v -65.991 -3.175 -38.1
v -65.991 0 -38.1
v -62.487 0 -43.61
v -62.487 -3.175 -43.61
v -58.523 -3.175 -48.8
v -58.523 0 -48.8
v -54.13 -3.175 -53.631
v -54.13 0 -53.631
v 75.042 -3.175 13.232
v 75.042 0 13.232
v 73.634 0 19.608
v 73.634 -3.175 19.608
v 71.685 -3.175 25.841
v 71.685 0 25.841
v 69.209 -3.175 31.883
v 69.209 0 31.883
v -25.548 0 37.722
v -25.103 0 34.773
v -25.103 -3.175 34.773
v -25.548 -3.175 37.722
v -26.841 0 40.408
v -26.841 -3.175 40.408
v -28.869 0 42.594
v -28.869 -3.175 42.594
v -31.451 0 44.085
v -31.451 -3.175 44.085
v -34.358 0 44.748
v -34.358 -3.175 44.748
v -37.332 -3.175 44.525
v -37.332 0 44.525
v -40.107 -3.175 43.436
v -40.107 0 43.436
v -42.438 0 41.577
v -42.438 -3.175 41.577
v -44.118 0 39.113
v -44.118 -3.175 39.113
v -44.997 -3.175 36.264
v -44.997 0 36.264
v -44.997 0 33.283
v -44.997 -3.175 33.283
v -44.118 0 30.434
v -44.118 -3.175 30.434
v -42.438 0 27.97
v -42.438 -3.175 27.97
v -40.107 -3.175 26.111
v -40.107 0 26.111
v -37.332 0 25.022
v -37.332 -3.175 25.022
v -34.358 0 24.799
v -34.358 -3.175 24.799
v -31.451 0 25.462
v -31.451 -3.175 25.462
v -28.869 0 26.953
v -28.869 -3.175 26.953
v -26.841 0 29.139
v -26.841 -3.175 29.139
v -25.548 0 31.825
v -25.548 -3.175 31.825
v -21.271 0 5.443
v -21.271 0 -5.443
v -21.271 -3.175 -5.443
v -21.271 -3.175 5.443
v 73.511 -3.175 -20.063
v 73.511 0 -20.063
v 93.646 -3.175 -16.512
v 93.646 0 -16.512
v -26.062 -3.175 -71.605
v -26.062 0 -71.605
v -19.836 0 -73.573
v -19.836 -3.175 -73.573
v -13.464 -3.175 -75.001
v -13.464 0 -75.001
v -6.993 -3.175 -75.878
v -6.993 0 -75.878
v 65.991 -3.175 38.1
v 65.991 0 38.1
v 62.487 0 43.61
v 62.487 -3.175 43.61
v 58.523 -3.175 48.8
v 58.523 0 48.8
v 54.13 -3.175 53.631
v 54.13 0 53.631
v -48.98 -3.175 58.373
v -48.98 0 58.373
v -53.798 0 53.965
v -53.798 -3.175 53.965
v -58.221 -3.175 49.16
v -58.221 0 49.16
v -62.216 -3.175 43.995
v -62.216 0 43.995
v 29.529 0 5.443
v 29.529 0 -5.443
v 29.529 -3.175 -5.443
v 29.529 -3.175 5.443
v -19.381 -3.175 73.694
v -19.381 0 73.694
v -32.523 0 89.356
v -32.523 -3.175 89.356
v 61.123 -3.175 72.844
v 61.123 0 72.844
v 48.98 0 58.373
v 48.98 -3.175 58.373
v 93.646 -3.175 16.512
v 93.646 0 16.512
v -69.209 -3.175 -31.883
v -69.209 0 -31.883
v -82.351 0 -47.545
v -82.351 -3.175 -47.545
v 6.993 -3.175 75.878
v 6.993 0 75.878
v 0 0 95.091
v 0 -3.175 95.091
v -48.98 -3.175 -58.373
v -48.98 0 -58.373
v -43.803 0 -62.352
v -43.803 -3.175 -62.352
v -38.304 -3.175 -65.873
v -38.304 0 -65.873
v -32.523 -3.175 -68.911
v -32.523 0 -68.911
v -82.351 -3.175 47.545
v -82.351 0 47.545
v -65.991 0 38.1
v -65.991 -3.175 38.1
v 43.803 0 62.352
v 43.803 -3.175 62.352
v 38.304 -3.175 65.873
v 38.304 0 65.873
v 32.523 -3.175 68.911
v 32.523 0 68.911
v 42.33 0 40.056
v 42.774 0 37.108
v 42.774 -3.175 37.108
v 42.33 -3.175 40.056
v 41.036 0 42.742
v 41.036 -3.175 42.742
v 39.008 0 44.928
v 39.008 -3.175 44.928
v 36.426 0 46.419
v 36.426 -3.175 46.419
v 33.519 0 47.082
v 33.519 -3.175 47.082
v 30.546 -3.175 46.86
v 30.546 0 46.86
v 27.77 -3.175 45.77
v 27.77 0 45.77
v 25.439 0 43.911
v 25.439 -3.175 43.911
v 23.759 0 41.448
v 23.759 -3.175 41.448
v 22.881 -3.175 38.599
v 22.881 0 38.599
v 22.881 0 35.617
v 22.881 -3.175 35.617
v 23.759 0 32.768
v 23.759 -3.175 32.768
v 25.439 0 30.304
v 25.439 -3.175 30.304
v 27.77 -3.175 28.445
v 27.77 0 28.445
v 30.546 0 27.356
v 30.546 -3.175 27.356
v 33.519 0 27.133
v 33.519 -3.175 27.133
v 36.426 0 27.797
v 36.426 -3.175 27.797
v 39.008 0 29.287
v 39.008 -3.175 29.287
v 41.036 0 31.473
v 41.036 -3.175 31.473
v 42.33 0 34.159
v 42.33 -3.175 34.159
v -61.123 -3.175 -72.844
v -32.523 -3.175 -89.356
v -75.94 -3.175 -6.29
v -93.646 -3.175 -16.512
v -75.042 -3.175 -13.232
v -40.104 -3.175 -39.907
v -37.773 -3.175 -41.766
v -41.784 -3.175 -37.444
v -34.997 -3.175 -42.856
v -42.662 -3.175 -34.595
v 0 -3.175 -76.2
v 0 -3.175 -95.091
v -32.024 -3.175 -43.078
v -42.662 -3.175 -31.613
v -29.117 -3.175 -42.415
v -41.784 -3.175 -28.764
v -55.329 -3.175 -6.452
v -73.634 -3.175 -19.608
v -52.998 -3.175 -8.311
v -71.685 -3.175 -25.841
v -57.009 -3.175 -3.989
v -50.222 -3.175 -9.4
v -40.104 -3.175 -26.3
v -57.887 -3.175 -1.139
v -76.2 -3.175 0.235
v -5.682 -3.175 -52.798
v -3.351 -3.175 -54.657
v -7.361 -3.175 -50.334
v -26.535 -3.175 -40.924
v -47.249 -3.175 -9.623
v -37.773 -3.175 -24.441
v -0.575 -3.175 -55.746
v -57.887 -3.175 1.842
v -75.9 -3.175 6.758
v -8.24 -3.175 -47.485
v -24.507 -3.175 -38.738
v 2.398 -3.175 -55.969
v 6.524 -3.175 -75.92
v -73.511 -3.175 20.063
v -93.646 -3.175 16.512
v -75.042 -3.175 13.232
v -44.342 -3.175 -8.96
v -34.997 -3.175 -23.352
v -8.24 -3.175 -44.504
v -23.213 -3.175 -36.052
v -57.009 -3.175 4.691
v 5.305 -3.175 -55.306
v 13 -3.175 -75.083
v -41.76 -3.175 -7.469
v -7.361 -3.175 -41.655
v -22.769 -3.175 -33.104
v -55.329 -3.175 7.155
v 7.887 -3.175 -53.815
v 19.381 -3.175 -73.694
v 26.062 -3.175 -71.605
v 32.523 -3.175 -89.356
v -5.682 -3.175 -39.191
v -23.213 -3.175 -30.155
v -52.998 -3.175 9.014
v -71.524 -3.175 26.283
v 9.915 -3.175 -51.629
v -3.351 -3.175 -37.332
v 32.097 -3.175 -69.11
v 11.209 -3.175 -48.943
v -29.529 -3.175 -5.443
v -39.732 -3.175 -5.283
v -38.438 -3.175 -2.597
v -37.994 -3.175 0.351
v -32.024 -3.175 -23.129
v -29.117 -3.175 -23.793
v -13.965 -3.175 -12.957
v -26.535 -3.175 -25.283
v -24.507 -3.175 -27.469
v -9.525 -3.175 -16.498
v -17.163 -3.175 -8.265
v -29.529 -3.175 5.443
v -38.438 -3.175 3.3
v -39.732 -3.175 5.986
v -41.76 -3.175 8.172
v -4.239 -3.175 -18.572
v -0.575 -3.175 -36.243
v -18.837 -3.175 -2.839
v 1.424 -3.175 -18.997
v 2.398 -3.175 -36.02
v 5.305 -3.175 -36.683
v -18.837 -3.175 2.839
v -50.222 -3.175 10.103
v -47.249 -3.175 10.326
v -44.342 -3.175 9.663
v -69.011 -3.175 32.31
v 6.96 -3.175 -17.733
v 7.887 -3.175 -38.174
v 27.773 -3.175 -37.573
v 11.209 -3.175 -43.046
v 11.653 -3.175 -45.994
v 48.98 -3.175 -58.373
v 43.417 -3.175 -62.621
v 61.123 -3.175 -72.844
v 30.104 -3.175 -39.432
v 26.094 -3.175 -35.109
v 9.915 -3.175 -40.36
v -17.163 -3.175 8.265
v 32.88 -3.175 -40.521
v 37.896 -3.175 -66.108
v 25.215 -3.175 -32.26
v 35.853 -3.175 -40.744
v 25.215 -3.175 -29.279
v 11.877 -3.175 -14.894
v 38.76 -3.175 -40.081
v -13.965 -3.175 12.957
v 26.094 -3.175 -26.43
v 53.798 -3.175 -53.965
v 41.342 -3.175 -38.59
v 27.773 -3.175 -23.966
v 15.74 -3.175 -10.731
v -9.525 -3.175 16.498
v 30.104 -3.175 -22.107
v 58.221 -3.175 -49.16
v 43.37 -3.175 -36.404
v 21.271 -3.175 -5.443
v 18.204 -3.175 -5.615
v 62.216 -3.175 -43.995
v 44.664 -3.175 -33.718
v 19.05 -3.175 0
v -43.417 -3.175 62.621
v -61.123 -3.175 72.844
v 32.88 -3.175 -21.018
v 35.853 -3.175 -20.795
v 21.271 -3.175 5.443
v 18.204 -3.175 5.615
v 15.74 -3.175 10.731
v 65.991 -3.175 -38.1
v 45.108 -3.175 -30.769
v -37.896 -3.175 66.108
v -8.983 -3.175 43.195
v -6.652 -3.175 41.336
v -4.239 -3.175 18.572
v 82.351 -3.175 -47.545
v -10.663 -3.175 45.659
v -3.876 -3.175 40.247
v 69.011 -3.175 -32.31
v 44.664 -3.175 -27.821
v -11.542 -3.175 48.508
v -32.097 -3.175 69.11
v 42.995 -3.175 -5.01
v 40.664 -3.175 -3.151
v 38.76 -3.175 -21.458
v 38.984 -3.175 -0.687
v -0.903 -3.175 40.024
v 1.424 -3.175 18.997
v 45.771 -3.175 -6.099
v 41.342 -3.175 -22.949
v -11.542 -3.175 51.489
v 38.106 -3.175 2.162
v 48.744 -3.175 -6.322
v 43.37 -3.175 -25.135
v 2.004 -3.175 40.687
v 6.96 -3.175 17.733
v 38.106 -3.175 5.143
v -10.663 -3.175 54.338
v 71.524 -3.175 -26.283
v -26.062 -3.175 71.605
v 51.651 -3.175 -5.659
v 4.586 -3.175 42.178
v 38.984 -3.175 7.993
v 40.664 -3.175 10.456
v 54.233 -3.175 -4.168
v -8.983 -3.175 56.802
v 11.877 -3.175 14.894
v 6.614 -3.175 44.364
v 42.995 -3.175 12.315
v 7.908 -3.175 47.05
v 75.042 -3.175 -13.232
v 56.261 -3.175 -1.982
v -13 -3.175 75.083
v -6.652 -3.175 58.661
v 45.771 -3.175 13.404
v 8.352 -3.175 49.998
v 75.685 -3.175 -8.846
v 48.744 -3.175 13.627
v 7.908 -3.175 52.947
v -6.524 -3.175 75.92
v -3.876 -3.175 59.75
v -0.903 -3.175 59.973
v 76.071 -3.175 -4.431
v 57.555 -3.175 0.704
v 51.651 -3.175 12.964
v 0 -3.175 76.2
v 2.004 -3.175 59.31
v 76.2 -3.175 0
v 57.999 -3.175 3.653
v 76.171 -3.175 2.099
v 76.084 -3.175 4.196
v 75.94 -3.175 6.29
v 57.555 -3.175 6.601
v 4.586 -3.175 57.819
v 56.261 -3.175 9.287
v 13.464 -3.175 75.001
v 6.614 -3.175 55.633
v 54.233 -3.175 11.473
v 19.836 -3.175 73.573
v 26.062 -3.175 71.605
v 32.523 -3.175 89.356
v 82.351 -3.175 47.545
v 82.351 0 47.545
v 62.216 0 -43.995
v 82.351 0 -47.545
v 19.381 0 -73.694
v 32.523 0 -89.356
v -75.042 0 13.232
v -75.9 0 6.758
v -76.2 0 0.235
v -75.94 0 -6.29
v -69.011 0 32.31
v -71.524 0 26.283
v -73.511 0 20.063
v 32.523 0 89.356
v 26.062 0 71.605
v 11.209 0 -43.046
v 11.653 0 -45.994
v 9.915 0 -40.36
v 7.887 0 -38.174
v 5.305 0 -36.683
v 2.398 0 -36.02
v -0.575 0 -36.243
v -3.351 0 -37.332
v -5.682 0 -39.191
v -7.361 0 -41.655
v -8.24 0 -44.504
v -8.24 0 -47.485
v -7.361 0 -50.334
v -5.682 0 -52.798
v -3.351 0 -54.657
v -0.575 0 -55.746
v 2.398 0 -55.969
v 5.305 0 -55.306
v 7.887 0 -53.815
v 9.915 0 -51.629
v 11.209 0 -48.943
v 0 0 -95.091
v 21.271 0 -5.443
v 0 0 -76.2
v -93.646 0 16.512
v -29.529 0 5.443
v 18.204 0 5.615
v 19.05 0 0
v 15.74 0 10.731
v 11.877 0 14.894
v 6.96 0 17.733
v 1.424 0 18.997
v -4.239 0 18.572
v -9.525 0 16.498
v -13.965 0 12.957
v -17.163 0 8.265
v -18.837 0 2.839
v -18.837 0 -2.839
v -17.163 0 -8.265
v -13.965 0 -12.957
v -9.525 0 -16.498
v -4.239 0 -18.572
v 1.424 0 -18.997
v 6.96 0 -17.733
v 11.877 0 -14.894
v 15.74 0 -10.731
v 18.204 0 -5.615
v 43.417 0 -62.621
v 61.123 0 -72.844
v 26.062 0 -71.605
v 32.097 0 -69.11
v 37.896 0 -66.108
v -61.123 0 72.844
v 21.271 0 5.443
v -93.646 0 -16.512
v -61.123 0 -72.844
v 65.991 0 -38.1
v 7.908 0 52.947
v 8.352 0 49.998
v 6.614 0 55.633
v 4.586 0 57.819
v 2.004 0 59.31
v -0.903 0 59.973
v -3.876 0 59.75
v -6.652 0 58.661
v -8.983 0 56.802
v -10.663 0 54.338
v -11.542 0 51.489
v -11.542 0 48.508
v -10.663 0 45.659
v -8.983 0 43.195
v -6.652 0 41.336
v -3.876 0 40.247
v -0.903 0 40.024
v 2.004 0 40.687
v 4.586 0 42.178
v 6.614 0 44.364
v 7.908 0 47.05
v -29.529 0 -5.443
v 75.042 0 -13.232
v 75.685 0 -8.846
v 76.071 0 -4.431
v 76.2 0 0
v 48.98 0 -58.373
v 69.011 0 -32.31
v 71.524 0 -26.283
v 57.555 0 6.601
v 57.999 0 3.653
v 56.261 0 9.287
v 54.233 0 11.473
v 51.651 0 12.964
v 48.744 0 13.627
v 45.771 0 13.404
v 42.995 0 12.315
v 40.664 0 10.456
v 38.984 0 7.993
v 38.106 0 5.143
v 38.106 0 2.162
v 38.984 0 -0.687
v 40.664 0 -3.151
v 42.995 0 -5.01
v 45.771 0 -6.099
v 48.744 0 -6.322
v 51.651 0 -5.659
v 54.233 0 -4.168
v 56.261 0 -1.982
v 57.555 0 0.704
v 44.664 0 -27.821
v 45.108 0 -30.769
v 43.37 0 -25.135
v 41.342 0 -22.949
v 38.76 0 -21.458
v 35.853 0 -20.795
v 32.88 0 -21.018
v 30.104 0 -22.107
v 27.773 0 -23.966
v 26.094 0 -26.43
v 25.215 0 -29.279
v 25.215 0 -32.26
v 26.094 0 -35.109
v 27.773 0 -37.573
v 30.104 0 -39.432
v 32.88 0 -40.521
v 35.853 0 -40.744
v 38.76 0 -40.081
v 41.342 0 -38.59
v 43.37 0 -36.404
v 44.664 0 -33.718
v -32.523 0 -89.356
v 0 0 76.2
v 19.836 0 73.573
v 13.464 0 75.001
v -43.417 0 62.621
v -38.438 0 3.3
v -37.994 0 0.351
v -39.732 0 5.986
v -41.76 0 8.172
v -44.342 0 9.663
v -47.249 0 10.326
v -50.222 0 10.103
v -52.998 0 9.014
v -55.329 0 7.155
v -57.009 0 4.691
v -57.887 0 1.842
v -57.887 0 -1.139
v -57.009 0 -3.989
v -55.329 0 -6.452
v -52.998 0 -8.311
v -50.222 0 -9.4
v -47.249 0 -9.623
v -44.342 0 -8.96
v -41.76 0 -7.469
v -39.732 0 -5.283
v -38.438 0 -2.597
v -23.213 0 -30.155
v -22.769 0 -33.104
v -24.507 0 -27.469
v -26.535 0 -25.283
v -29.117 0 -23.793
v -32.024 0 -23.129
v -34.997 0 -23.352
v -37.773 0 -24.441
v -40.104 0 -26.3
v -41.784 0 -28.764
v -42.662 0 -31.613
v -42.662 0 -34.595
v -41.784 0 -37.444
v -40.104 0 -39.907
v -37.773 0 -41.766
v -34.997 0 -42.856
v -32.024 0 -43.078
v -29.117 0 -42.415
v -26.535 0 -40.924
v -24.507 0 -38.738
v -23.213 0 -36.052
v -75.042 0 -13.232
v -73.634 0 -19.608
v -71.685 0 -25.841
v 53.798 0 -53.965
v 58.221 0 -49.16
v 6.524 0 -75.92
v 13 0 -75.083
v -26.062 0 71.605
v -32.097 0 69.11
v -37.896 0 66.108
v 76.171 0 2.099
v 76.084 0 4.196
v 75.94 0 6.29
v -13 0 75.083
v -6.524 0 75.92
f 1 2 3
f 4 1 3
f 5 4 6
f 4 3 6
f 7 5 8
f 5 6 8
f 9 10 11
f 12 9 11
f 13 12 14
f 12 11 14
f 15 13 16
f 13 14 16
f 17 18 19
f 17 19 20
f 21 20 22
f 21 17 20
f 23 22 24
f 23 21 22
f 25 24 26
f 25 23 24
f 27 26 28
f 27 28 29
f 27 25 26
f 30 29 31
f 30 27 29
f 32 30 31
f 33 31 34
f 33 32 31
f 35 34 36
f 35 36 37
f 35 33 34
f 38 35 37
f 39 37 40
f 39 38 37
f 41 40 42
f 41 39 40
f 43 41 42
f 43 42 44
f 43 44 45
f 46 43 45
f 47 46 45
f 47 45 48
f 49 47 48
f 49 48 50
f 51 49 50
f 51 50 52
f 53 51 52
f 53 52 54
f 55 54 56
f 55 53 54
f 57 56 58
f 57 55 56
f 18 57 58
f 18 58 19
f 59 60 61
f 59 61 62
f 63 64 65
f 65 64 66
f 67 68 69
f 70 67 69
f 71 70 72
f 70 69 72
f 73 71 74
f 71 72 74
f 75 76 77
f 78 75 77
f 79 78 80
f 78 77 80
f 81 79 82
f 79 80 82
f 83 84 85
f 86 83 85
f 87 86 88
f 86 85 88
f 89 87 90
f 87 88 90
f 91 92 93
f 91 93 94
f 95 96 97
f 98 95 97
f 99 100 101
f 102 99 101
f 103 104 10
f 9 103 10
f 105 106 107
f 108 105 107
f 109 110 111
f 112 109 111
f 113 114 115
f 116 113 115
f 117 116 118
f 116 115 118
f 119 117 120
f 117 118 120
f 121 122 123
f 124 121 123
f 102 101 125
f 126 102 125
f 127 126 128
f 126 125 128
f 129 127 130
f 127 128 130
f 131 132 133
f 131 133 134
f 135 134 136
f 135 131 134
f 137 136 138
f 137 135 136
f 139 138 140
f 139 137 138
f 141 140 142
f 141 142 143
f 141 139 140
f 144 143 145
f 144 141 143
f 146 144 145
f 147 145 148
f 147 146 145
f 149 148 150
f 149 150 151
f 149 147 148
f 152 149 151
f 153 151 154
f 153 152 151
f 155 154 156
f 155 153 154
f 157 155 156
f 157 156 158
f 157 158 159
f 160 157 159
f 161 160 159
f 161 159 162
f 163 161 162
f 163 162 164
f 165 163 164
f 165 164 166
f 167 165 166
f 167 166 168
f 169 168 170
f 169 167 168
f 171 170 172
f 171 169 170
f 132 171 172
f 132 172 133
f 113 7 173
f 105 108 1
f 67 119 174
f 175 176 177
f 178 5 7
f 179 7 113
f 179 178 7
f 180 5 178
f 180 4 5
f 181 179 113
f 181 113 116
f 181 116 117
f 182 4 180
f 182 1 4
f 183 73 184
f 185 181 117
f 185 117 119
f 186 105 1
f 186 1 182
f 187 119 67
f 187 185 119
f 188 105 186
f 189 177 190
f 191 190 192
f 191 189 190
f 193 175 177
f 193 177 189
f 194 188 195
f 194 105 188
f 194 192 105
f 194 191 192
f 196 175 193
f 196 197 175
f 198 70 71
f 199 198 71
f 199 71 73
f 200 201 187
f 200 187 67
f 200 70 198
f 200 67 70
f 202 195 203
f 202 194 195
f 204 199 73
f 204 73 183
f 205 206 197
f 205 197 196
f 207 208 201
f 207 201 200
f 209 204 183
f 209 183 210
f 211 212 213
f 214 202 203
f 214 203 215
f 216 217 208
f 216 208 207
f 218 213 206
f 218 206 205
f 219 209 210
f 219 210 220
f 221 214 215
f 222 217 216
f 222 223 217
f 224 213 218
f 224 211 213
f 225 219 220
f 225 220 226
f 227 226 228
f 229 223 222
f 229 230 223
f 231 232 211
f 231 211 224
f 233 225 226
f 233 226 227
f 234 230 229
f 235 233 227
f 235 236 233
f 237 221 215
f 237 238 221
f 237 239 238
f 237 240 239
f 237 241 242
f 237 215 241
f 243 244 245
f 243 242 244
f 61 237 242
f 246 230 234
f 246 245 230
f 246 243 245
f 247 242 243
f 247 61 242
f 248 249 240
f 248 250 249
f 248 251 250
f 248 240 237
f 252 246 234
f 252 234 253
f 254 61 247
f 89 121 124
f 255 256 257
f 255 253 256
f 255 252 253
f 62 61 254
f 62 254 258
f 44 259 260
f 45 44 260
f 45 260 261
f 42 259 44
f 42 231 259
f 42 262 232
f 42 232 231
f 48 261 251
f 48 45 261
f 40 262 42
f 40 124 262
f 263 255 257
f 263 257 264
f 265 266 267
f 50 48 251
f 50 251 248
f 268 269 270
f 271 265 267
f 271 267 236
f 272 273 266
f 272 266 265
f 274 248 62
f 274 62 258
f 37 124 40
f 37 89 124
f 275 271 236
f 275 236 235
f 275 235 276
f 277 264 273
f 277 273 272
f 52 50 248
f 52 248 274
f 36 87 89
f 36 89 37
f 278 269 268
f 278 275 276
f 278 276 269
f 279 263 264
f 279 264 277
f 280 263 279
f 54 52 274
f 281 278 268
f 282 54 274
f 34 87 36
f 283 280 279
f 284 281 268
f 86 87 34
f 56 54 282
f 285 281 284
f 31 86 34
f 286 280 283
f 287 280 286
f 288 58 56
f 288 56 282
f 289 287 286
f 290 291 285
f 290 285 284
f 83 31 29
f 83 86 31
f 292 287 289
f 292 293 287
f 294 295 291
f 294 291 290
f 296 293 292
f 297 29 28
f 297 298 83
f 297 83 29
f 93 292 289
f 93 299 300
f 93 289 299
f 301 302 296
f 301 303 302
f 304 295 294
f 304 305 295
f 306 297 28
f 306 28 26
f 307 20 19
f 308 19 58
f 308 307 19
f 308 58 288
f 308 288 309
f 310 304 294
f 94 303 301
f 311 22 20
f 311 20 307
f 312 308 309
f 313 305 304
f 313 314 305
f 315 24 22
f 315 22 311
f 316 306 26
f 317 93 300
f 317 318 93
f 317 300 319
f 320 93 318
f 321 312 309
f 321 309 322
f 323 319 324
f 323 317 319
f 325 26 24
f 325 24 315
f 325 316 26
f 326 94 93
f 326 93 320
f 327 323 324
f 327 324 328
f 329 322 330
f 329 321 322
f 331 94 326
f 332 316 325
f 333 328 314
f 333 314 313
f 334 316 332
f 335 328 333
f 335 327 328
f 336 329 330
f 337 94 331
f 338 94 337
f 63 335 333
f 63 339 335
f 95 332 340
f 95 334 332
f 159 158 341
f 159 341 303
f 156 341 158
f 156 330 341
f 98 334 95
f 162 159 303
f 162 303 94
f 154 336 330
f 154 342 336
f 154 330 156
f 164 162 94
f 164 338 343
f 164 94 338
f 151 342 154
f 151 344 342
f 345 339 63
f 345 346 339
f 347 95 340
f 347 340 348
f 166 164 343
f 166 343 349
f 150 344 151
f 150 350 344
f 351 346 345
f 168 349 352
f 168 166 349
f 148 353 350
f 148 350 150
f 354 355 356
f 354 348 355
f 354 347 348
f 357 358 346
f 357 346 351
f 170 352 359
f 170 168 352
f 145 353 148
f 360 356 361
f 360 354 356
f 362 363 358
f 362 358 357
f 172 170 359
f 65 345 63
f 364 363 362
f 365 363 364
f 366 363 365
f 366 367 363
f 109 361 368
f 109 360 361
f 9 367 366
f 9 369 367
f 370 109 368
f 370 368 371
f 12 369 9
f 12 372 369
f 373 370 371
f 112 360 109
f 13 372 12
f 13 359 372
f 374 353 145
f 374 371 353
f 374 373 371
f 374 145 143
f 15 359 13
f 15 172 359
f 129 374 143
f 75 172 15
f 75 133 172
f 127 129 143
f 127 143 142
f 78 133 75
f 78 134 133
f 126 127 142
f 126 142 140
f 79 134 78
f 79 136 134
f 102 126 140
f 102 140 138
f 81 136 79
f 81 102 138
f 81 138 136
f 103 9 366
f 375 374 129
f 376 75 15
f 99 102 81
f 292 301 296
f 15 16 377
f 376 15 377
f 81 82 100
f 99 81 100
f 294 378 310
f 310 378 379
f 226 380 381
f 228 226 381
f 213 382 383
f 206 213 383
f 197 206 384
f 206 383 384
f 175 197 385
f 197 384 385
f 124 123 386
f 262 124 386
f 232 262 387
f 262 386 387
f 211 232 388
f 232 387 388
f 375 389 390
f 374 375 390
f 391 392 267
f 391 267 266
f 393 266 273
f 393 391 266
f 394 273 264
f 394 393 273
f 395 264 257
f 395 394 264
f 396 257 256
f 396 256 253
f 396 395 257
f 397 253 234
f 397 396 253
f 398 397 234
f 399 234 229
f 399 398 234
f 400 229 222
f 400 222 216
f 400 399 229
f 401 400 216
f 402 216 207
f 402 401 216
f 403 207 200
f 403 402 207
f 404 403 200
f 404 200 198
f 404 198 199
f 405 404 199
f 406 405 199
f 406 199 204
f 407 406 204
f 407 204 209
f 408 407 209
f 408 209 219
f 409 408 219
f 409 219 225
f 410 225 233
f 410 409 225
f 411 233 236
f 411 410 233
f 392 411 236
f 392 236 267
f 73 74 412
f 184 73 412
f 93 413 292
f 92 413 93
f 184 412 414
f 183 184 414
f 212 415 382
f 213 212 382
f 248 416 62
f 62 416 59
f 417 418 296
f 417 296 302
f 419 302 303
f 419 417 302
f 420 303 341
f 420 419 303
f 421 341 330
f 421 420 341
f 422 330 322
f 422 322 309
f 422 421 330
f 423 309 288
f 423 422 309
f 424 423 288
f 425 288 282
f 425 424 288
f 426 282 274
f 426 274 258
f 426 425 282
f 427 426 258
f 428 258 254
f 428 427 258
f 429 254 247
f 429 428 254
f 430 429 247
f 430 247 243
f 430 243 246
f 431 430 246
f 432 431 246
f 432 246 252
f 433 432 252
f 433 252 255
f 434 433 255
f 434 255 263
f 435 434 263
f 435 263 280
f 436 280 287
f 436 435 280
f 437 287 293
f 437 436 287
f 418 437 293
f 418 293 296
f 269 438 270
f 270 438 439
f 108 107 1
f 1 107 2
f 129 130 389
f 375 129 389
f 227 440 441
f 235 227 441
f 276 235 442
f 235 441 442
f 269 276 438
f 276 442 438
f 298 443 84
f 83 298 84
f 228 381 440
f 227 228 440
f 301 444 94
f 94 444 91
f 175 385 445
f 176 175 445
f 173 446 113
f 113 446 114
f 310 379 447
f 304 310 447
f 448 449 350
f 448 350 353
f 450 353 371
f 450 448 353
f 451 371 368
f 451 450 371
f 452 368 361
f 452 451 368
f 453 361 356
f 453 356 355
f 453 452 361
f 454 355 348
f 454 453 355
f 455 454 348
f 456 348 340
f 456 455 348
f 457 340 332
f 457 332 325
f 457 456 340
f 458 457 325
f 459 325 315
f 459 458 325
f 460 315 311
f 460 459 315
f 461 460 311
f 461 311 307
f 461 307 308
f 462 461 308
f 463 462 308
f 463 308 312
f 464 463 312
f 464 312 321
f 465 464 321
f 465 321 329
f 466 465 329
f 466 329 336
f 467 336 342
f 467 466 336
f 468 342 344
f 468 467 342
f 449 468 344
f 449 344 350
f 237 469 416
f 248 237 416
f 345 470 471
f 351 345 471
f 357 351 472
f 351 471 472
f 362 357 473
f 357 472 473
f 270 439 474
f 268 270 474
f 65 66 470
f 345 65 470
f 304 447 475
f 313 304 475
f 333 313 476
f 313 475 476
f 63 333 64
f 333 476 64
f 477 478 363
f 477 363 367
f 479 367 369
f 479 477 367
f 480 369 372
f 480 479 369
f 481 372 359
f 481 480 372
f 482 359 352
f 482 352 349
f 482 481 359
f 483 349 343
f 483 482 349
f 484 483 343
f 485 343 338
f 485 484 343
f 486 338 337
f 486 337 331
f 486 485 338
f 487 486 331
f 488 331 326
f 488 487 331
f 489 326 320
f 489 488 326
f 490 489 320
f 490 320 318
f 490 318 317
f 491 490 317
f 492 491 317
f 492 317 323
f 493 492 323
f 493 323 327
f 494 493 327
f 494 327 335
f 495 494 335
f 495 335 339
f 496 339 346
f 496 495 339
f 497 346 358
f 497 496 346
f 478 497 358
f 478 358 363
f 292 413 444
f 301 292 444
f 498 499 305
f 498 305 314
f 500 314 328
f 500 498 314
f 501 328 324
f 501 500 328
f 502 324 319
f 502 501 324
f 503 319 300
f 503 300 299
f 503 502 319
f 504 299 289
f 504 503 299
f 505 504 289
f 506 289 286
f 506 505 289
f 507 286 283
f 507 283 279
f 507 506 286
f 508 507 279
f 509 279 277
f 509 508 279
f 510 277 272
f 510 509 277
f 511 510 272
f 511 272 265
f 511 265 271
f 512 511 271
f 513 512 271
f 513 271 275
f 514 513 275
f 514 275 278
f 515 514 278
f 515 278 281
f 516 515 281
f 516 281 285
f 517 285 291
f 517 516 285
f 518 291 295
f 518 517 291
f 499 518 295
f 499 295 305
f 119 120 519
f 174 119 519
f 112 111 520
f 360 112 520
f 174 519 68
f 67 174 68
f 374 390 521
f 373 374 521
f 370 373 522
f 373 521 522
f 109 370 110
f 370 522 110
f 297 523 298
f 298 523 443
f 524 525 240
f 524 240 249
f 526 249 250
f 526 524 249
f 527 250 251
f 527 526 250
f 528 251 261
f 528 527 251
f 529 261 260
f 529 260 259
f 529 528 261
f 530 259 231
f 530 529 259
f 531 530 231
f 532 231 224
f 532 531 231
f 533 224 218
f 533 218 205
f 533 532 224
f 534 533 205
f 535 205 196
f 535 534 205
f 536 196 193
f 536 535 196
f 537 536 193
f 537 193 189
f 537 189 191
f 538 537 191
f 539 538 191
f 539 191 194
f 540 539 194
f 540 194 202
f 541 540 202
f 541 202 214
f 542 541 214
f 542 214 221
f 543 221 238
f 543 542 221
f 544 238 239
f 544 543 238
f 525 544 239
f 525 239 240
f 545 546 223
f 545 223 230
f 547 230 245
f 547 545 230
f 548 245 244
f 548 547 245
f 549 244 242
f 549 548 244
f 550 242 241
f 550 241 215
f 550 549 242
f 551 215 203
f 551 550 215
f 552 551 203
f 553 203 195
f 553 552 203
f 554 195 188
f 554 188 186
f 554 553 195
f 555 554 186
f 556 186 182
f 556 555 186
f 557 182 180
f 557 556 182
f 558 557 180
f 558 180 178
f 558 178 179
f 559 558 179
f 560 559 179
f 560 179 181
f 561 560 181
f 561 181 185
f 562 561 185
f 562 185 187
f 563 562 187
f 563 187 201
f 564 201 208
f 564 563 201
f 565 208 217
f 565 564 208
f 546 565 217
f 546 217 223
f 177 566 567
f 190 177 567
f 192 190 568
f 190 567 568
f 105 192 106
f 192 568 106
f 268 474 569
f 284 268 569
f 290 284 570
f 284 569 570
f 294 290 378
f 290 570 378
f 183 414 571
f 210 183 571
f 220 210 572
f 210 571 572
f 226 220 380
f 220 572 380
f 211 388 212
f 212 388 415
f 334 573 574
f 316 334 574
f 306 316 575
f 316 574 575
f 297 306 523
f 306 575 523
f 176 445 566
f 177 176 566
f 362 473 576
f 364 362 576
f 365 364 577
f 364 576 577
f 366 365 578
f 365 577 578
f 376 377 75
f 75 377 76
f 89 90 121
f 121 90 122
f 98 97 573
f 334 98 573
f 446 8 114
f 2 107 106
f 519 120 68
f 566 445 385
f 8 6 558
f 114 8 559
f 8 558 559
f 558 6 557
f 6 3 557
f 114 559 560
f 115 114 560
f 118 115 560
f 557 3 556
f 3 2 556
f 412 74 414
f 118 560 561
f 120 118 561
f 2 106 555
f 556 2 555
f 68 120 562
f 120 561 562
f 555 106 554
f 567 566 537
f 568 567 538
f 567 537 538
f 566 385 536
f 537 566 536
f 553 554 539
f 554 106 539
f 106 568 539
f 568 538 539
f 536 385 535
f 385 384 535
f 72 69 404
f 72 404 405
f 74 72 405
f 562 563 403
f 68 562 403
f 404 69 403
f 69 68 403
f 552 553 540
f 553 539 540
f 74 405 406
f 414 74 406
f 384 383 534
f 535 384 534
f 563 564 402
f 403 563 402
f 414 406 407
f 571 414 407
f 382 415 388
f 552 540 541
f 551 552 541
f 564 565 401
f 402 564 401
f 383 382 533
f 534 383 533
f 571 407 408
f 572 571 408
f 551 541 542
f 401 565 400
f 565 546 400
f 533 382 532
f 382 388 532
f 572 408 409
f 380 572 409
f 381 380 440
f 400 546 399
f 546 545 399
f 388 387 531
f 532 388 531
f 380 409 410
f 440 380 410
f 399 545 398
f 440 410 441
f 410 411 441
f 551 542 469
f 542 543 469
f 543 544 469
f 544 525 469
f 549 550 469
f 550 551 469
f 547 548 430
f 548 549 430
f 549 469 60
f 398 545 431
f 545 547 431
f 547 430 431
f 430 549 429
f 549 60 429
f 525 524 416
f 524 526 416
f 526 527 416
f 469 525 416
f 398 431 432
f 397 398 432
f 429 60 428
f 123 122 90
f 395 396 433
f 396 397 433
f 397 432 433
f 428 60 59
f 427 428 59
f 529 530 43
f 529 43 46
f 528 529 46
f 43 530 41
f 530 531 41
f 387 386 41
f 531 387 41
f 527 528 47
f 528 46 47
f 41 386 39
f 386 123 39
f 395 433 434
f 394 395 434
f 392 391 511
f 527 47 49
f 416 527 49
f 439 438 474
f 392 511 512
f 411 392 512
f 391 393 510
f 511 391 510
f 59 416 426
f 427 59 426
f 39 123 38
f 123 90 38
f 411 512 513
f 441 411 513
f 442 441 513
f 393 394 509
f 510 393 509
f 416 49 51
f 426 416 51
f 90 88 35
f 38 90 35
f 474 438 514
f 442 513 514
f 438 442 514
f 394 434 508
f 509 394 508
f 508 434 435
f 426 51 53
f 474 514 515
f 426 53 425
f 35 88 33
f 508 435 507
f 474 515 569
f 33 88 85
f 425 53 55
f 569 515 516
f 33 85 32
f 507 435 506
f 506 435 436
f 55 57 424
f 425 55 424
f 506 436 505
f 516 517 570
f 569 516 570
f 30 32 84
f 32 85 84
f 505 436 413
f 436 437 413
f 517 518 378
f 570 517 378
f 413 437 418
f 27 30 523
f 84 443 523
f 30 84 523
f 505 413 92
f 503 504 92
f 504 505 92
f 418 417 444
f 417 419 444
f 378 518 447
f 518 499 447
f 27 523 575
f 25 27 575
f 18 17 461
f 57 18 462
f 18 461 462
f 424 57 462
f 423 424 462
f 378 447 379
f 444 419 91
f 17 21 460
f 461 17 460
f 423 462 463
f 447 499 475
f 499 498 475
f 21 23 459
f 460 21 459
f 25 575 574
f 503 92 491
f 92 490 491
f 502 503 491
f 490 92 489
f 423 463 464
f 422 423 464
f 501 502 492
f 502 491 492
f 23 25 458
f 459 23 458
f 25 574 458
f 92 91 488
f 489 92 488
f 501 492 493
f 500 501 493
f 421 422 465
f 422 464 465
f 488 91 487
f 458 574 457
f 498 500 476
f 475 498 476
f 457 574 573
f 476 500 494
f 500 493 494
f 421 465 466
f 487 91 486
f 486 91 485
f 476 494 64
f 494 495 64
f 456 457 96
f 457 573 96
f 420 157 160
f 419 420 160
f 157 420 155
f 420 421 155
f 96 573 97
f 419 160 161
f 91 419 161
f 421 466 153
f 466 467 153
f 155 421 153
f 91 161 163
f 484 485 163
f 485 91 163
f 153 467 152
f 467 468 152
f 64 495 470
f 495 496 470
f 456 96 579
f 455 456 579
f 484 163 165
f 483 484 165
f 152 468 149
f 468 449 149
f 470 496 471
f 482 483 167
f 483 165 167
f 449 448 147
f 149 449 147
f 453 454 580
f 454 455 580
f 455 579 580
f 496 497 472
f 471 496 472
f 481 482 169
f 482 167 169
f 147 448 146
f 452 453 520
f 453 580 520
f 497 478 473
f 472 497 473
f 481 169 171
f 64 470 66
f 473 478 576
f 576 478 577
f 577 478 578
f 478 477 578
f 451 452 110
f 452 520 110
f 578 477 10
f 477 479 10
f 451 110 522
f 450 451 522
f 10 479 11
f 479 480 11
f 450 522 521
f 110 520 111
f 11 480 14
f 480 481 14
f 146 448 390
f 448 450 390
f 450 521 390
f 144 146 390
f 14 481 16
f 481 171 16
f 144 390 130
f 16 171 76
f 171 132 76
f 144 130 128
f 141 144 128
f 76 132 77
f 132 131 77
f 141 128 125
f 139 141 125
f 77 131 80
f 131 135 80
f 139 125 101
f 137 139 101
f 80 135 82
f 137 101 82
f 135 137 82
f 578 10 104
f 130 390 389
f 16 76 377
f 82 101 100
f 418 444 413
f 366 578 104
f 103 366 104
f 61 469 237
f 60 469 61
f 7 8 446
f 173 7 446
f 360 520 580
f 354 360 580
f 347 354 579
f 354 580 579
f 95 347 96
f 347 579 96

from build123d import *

# Parameters (mm, degrees)
F0_R     = 10.002614
F0_W     = 8.257874
F0_H     = 10.88538
F0_R_2   = 19.05
F1_DEPTH = 3.175


with BuildPart() as f1:
    # F0 (on Front) → F1 (new body)
    with BuildSketch(Plane.XZ):
        with BuildLine():
            ThreePointArc((75.042351, -13.231991), (75.910036, -6.641268), (76.2, 0))
            ThreePointArc((76.2, 0), (76.134965, 3.14755), (75.939972, 6.289727))
            ThreePointArc((75.939972, 6.289727), (75.570922, 9.771172), (75.042351, 13.231991))
            ThreePointArc((75.042351, 13.231991), (72.726083, 22.745479), (69.209018, 31.88341))
            ThreePointArc((69.209018, 31.88341), (67.6715, 35.028675), (65.991136, 38.1))
            ThreePointArc((65.991136, 38.1), (60.560752, 46.247544), (54.130435, 53.631483))
            ThreePointArc((54.130435, 53.631483), (51.609896, 56.061204), (48.980416, 58.372587))
            ThreePointArc((48.980416, 58.372587), (41.0909, 64.171473), (32.522923, 68.910808))
            ThreePointArc((32.522923, 68.910808), (29.323378, 70.331924), (26.061935, 71.604578))
            ThreePointArc((26.061935, 71.604578), (16.664879, 74.355375), (6.992666, 75.878473))
            ThreePointArc((6.992666, 75.878473), (3.500027, 76.119576), (0, 76.2))
            ThreePointArc((0, 76.2), (-9.771172, 75.570922), (-19.381009, 73.694074))
            ThreePointArc((-19.381009, 73.694074), (-22.745479, 72.726083), (-26.061935, 71.604578))
            ThreePointArc((-26.061935, 71.604578), (-35.028675, 67.6715), (-43.417049, 62.621082))
            ThreePointArc((-43.417049, 62.621082), (-46.247544, 60.560752), (-48.980416, 58.372587))
            ThreePointArc((-48.980416, 58.372587), (-56.061204, 51.609896), (-62.216352, 43.995063))
            ThreePointArc((-62.216352, 43.995063), (-64.171473, 41.0909), (-65.991136, 38.1))
            ThreePointArc((-65.991136, 38.1), (-70.331924, 29.323378), (-73.511444, 20.06259))
            ThreePointArc((-73.511444, 20.06259), (-74.355375, 16.664879), (-75.042351, 13.231991))
            ThreePointArc((-75.042351, 13.231991), (-76.119576, 3.500027), (-75.939972, -6.289727))
            ThreePointArc((-75.939972, -6.289727), (-75.570922, -9.771172), (-75.042351, -13.231991))
            ThreePointArc((-75.042351, -13.231991), (-72.726083, -22.745479), (-69.209018, -31.88341))
            ThreePointArc((-69.209018, -31.88341), (-67.6715, -35.028675), (-65.991136, -38.1))
            ThreePointArc((-65.991136, -38.1), (-60.560752, -46.247544), (-54.130435, -53.631483))
            ThreePointArc((-54.130435, -53.631483), (-51.609896, -56.061204), (-48.980416, -58.372587))
            ThreePointArc((-48.980416, -58.372587), (-41.0909, -64.171473), (-32.522923, -68.910808))
            ThreePointArc((-32.522923, -68.910808), (-29.323378, -70.331924), (-26.061935, -71.604578))
            ThreePointArc((-26.061935, -71.604578), (-16.664879, -74.355375), (-6.992666, -75.878473))
            ThreePointArc((-6.992666, -75.878473), (-3.500027, -76.119576), (0, -76.2))
            ThreePointArc((0, -76.2), (9.771172, -75.570922), (19.381009, -73.694074))
            ThreePointArc((19.381009, -73.694074), (22.745479, -72.726083), (26.061935, -71.604578))
            ThreePointArc((26.061935, -71.604578), (35.028675, -67.6715), (43.417049, -62.621082))
            ThreePointArc((43.417049, -62.621082), (46.247544, -60.560752), (48.980416, -58.372587))
            ThreePointArc((48.980416, -58.372587), (56.061204, -51.609896), (62.216352, -43.995063))
            ThreePointArc((62.216352, -43.995063), (64.171473, -41.0909), (65.991136, -38.1))
            ThreePointArc((65.991136, -38.1), (70.331924, -29.323378), (73.511444, -20.06259))
            ThreePointArc((73.511444, -20.06259), (74.355375, -16.664879), (75.042351, -13.231991))
        make_face()
        with Locations((-32.771484, -33.103804)):
            Circle(F0_R, mode=Mode.SUBTRACT)
        with Locations((1.650614, -45.994491)):
            Circle(F0_R, mode=Mode.SUBTRACT)
        with Locations((35.105805, -30.769484)):
            Circle(F0_R, mode=Mode.SUBTRACT)
        with Locations((-47.996491, 0.351386)):
            Circle(F0_R, mode=Mode.SUBTRACT)
        with Locations((-25.4, 0)):
            Rectangle(F0_W, F0_H, mode=Mode.SUBTRACT)
        with Locations((-35.105805, 34.773484)):
            Circle(F0_R, mode=Mode.SUBTRACT)
        with Locations((-1.650614, 49.998491)):
            Circle(F0_R, mode=Mode.SUBTRACT)
        Circle(F0_R_2, mode=Mode.SUBTRACT)
        with Locations((25.4, 0)):
            Rectangle(F0_W, F0_H, mode=Mode.SUBTRACT)
        with Locations((32.771484, 37.107805)):
            Circle(F0_R, mode=Mode.SUBTRACT)
        with Locations((47.996491, 3.652614)):
            Circle(F0_R, mode=Mode.SUBTRACT)
        with BuildLine():
            ThreePointArc((75.042351, 13.231991), (75.570922, 9.771172), (75.939972, 6.289727))
            Line((75.939972, 6.289727), (93.646024, 16.512321))
            Line((93.646024, 16.512321), (75.042351, 13.231991))
        make_face()
        with BuildLine():
            Line((93.646024, -16.512321), (75.042351, -13.231991))
            ThreePointArc((75.042351, -13.231991), (74.355375, -16.664879), (73.511444, -20.06259))
            Line((73.511444, -20.06259), (93.646024, -16.512321))
        make_face()
        with BuildLine():
            ThreePointArc((65.991136, 38.1), (67.6715, 35.028675), (69.209018, 31.88341))
            Line((69.209018, 31.88341), (82.350931, 47.545332))
            Line((82.350931, 47.545332), (65.991136, 38.1))
        make_face()
        with BuildLine():
            Line((82.350931, -47.545332), (65.991136, -38.1))
            ThreePointArc((65.991136, -38.1), (64.171473, -41.0909), (62.216352, -43.995063))
            Line((62.216352, -43.995063), (82.350931, -47.545332))
        make_face()
        with BuildLine():
            ThreePointArc((48.980416, 58.372587), (51.609896, 56.061204), (54.130435, 53.631483))
            Line((54.130435, 53.631483), (61.123101, 72.843675))
            Line((61.123101, 72.843675), (48.980416, 58.372587))
        make_face()
        with BuildLine():
            Line((61.123101, -72.843675), (48.980416, -58.372587))
            ThreePointArc((48.980416, -58.372587), (46.247544, -60.560752), (43.417049, -62.621082))
            Line((43.417049, -62.621082), (61.123101, -72.843675))
        make_face()
        with BuildLine():
            ThreePointArc((26.061935, 71.604578), (29.323378, 70.331924), (32.522923, 68.910808))
            Line((32.522923, 68.910808), (32.522923, 89.355996))
            Line((32.522923, 89.355996), (26.061935, 71.604578))
        make_face()
        with BuildLine():
            Line((32.522923, -89.355996), (26.061935, -71.604578))
            ThreePointArc((26.061935, -71.604578), (22.745479, -72.726083), (19.381009, -73.694074))
            Line((19.381009, -73.694074), (32.522923, -89.355996))
        make_face()
        with BuildLine():
            ThreePointArc((0, 76.2), (3.500027, 76.119576), (6.992666, 75.878473))
            Line((6.992666, 75.878473), (0, 95.090665))
            Line((0, 95.090665), (0, 76.2))
        make_face()
        with BuildLine():
            Line((0, -95.090665), (0, -76.2))
            ThreePointArc((0, -76.2), (-3.500027, -76.119576), (-6.992666, -75.878473))
            Line((-6.992666, -75.878473), (0, -95.090665))
        make_face()
        with BuildLine():
            ThreePointArc((-26.061935, 71.604578), (-22.745479, 72.726083), (-19.381009, 73.694074))
            Line((-19.381009, 73.694074), (-32.522923, 89.355996))
            Line((-32.522923, 89.355996), (-26.061935, 71.604578))
        make_face()
        with BuildLine():
            Line((-32.522923, -89.355996), (-26.061935, -71.604578))
            ThreePointArc((-26.061935, -71.604578), (-29.323378, -70.331924), (-32.522923, -68.910808))
            Line((-32.522923, -68.910808), (-32.522923, -89.355996))
        make_face()
        with BuildLine():
            ThreePointArc((-48.980416, 58.372587), (-46.247544, 60.560752), (-43.417049, 62.621082))
            Line((-43.417049, 62.621082), (-61.123101, 72.843675))
            Line((-61.123101, 72.843675), (-48.980416, 58.372587))
        make_face()
        with BuildLine():
            Line((-61.123101, -72.843675), (-48.980416, -58.372587))
            ThreePointArc((-48.980416, -58.372587), (-51.609896, -56.061204), (-54.130435, -53.631483))
            Line((-54.130435, -53.631483), (-61.123101, -72.843675))
        make_face()
        with BuildLine():
            ThreePointArc((-65.991136, 38.1), (-64.171473, 41.0909), (-62.216352, 43.995063))
            Line((-62.216352, 43.995063), (-82.350931, 47.545332))
            Line((-82.350931, 47.545332), (-65.991136, 38.1))
        make_face()
        with BuildLine():
            Line((-82.350931, -47.545332), (-65.991136, -38.1))
            ThreePointArc((-65.991136, -38.1), (-67.6715, -35.028675), (-69.209018, -31.88341))
            Line((-69.209018, -31.88341), (-82.350931, -47.545332))
        make_face()
        with BuildLine():
            ThreePointArc((-75.042351, 13.231991), (-74.355375, 16.664879), (-73.511444, 20.06259))
            Line((-73.511444, 20.06259), (-93.646024, 16.512321))
            Line((-93.646024, 16.512321), (-75.042351, 13.231991))
        make_face()
        with BuildLine():
            Line((-93.646024, -16.512321), (-75.042351, -13.231991))
            ThreePointArc((-75.042351, -13.231991), (-75.570922, -9.771172), (-75.939972, -6.289727))
            Line((-75.939972, -6.289727), (-93.646024, -16.512321))
        make_face()
    extrude(amount=F1_DEPTH)


solid = f1.part
